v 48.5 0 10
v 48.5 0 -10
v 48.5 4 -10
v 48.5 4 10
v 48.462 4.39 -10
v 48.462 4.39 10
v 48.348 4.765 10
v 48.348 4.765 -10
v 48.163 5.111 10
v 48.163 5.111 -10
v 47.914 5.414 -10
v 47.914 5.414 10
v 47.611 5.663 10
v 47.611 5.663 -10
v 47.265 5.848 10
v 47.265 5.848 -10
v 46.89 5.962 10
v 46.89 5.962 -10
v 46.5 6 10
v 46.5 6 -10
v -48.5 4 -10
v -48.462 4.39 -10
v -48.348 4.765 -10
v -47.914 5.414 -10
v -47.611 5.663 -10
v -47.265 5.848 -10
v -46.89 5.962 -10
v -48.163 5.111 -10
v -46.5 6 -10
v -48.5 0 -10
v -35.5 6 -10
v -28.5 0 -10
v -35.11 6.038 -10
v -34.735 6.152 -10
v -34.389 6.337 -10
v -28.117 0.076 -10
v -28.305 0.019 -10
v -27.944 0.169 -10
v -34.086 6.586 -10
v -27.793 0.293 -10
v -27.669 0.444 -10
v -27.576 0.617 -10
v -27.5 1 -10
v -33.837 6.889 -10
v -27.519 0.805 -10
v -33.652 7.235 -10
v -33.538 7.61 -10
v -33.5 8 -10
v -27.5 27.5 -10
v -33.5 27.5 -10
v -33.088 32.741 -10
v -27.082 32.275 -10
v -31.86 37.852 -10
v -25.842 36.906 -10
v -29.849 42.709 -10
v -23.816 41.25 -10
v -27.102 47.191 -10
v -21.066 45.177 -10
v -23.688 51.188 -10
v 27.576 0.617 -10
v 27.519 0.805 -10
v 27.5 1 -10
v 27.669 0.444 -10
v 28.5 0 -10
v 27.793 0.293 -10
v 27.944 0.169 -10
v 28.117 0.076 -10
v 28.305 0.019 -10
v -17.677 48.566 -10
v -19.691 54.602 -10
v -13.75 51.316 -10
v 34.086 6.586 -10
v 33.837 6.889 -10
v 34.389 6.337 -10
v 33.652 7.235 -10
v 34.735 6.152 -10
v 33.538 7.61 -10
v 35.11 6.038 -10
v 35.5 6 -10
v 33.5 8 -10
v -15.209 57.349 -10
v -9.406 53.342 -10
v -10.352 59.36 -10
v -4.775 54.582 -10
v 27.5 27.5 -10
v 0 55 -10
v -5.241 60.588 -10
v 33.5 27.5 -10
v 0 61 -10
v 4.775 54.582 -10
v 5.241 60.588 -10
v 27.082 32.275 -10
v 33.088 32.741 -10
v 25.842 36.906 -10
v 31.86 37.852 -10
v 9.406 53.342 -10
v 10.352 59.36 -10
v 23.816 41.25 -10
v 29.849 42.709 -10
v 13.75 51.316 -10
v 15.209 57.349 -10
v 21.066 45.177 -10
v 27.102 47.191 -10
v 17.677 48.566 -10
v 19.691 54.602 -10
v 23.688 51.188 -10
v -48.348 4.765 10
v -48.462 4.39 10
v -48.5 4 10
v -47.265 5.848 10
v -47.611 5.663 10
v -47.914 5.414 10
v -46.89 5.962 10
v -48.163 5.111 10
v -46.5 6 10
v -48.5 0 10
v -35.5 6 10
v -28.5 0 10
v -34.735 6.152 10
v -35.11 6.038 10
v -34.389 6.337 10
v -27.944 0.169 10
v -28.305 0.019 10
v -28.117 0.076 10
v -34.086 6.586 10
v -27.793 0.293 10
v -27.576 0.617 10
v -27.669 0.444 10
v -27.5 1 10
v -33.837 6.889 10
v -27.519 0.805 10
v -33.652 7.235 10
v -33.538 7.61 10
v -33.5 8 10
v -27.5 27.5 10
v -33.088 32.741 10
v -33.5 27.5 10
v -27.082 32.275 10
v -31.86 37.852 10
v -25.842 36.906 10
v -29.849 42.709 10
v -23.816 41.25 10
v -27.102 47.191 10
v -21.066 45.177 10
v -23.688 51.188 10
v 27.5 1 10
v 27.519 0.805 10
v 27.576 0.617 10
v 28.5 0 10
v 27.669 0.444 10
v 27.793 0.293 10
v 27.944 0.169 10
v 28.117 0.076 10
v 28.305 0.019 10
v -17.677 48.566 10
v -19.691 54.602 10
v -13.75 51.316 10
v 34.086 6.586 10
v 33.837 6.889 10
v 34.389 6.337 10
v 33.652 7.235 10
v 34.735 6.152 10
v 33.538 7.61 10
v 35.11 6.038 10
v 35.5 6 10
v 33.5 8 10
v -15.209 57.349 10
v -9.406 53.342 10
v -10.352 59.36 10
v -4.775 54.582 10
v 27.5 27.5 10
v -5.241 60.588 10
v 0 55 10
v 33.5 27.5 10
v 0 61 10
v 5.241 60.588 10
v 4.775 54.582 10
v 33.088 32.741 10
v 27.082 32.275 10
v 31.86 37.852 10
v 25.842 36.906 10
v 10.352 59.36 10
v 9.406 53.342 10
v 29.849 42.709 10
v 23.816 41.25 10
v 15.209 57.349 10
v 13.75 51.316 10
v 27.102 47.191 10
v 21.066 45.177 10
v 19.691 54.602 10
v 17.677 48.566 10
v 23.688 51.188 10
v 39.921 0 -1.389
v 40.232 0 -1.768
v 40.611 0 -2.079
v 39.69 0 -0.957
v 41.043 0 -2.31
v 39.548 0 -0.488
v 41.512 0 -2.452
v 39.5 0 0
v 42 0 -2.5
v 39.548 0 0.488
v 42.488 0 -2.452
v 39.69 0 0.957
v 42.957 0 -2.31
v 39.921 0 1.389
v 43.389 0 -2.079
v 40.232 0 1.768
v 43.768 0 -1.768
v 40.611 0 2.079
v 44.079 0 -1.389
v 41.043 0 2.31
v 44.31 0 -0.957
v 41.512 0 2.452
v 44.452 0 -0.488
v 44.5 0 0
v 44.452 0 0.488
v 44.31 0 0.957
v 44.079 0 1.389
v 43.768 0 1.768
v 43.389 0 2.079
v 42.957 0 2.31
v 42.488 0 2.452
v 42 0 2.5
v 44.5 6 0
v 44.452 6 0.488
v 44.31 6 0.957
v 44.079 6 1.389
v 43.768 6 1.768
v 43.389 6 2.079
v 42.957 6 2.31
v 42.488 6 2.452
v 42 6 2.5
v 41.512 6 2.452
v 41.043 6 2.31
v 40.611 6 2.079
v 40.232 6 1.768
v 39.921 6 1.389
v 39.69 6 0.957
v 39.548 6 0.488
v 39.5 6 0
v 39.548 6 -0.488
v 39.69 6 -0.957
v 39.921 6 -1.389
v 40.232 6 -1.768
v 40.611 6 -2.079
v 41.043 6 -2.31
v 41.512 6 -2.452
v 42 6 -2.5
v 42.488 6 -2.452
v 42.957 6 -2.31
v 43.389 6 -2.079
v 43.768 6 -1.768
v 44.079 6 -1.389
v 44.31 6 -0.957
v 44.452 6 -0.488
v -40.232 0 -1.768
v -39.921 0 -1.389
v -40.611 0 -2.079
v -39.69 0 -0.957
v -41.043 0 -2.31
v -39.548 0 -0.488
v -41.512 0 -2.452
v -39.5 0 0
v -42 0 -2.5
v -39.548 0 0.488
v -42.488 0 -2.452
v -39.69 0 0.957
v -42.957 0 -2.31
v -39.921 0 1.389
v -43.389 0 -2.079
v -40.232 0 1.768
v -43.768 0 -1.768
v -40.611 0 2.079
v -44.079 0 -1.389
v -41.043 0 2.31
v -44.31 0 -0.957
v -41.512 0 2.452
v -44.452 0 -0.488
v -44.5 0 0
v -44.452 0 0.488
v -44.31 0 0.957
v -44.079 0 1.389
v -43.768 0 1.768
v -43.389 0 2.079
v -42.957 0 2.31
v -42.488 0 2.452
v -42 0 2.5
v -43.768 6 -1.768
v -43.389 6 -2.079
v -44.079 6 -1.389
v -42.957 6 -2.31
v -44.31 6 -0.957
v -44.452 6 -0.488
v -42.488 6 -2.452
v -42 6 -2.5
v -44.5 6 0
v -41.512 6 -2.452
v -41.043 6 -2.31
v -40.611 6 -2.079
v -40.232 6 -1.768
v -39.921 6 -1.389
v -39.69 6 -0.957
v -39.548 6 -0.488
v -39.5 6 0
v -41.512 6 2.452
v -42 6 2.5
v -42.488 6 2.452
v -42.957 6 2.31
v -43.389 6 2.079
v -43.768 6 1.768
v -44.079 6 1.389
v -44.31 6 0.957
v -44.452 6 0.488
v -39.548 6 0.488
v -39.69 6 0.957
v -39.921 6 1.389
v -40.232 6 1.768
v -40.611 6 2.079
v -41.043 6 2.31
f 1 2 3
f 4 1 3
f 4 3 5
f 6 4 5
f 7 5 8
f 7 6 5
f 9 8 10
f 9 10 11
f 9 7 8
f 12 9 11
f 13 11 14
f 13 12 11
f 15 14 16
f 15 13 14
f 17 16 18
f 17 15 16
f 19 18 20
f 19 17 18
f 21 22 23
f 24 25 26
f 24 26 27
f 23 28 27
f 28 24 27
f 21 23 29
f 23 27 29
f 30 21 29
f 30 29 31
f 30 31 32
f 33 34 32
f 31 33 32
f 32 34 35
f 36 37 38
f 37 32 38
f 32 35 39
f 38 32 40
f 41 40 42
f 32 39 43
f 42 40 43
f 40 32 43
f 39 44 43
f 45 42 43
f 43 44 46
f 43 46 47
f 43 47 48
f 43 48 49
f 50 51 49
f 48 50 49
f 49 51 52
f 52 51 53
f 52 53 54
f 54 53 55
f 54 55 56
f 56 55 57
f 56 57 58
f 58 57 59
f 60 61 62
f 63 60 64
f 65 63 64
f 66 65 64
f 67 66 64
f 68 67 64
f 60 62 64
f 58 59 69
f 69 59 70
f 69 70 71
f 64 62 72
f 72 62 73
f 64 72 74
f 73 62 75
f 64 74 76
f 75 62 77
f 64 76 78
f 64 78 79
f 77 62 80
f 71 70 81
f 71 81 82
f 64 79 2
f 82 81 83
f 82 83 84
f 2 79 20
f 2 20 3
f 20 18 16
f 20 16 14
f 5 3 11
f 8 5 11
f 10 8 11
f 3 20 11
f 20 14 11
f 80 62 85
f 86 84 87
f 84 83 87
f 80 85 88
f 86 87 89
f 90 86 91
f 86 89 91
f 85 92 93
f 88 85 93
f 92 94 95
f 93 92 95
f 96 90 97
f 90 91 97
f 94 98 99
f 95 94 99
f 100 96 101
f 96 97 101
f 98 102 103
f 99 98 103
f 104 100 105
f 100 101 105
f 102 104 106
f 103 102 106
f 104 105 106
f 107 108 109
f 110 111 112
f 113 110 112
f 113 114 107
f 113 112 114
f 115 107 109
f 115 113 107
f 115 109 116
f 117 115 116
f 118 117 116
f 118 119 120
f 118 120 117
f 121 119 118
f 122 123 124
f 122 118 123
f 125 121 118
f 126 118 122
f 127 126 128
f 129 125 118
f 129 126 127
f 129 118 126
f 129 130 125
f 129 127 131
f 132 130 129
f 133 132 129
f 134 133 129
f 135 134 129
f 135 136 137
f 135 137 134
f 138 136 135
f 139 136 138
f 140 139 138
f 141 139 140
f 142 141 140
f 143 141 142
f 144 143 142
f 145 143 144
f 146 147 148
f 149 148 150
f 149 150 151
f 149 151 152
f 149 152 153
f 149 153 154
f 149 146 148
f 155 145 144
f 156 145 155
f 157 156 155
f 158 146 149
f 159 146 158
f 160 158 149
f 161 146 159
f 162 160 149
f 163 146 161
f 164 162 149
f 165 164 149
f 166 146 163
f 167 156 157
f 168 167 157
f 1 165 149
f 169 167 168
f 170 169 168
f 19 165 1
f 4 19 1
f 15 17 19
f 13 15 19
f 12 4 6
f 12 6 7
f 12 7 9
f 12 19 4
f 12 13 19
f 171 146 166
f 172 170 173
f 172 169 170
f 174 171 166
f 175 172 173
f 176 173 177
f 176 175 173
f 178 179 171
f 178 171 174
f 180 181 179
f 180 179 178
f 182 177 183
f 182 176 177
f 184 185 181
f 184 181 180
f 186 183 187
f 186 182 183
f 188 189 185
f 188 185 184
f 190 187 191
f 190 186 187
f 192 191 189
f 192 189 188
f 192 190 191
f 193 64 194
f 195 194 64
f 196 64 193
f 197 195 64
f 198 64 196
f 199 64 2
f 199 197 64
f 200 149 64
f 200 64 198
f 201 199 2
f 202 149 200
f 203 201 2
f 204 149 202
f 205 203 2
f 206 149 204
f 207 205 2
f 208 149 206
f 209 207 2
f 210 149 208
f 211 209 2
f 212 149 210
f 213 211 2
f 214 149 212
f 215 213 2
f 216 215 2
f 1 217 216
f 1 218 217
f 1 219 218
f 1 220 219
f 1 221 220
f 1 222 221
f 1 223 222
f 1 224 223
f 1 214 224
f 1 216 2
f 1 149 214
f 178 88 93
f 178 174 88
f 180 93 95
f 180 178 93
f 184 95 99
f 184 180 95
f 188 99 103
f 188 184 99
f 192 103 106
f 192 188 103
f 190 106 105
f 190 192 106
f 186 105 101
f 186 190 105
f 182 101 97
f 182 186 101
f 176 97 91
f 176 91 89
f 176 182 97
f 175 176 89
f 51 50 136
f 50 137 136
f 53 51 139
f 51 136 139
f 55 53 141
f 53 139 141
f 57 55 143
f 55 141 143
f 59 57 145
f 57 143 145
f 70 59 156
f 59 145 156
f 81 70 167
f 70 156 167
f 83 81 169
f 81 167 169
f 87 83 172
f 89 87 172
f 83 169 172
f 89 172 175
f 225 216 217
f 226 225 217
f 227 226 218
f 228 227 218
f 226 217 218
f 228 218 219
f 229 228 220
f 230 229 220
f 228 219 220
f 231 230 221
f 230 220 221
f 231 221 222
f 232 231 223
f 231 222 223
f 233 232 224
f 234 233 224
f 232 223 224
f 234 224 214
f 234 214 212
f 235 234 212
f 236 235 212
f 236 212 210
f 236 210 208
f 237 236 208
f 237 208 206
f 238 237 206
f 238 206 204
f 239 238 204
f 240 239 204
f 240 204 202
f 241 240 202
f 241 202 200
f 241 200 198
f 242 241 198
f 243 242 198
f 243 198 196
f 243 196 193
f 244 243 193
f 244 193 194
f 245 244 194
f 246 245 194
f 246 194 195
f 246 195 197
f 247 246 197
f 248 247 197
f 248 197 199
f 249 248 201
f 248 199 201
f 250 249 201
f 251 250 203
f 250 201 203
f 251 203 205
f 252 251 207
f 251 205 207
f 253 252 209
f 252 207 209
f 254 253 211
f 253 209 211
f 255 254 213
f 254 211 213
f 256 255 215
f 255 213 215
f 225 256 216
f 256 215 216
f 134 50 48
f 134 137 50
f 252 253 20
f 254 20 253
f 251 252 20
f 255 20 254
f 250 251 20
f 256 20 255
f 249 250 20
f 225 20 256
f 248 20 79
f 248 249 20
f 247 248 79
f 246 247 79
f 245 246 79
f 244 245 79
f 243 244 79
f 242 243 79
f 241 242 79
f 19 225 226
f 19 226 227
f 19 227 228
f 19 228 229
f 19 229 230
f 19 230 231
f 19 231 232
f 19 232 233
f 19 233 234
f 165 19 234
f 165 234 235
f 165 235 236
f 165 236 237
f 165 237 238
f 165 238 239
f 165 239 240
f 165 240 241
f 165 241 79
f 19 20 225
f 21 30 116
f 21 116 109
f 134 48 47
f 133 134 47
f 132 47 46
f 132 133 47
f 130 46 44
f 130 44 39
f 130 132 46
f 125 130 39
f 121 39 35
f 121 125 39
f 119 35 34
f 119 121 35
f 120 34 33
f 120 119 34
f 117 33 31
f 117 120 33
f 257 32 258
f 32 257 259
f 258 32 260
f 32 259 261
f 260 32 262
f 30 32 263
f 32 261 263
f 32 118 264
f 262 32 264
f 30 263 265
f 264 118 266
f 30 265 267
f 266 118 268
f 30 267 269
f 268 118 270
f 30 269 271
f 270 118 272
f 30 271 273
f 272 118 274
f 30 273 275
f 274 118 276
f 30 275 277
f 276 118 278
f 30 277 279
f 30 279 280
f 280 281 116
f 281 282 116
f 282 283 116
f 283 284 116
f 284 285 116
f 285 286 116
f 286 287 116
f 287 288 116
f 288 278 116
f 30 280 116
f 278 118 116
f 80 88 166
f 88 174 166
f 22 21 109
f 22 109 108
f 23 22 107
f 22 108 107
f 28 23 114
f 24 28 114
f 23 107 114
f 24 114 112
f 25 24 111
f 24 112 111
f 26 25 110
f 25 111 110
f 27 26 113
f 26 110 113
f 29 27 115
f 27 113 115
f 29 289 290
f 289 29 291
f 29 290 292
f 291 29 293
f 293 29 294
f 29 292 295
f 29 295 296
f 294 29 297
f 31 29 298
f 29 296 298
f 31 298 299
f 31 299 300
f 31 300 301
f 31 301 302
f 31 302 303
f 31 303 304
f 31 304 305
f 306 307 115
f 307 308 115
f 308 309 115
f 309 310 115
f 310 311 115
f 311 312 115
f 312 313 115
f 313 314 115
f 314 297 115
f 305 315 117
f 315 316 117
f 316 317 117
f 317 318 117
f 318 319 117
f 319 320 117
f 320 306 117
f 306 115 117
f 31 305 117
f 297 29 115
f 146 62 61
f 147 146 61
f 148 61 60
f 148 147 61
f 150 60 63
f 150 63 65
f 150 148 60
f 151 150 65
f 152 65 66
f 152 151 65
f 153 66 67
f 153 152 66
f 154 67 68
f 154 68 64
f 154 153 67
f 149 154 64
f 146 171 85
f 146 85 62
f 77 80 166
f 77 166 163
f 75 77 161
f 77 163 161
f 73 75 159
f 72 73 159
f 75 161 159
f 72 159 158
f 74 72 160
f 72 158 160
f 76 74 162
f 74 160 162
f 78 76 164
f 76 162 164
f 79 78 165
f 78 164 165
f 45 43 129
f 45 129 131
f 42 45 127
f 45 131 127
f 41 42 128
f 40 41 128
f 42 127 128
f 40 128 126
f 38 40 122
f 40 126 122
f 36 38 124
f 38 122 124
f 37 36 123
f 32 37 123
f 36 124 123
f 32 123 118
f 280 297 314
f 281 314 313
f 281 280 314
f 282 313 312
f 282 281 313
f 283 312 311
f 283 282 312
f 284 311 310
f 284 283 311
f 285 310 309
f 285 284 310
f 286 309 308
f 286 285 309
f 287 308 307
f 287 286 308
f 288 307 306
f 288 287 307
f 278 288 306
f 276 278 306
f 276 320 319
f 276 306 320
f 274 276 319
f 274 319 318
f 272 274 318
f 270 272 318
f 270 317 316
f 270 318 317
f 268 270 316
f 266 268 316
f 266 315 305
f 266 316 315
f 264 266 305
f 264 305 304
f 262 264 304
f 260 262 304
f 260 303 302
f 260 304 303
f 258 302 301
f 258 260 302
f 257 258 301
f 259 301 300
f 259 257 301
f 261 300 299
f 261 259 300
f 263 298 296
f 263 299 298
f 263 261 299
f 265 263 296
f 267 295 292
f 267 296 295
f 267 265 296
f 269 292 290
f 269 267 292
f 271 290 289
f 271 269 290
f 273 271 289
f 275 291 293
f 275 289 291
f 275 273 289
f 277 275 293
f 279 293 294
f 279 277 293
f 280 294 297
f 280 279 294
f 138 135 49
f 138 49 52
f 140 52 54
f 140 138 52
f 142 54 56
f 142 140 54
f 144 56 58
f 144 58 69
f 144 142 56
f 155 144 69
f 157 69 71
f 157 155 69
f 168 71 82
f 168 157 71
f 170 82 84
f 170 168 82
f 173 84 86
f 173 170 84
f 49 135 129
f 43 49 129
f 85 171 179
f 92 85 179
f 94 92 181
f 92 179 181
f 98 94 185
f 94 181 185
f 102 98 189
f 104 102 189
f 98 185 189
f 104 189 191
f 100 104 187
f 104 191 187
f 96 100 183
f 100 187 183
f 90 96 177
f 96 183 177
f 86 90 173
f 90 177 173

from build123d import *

# Parameters (mm, degrees)
PAD_DEPTH                  = 10
SKETCH001_R                = 2.5
POCKET_DEPTH               = 293.638056
SKETCH001_MIRRORED001_2_R  = 2.5
POCKET_MIRRORED001_2_DEPTH = 293.638056


with BuildPart() as part:
    # Sketch → Pad (new body, symmetric)
    with BuildSketch(Plane.XY):
        with BuildLine():
            ThreePointArc((27.5, 27.5), (19.445436, 46.945436), (0, 55))
            Line((0, 55), (0, 61))
            ThreePointArc((33.5, 27.5), (23.688077, 51.188077), (0, 61))
            Line((33.5, 27.5), (33.5, 8))
            ThreePointArc((33.5, 8), (34.085786, 6.585786), (35.5, 6))
            Line((46.5, 6), (35.5, 6))
            ThreePointArc((48.5, 4), (47.914214, 5.414214), (46.5, 6))
            Line((48.5, 0), (48.5, 4))
            Line((28.5, 0), (48.5, 0))
            ThreePointArc((27.5, 1), (27.792893, 0.292893), (28.5, 0))
            Line((27.5, 27.5), (27.5, 1))
        make_face()
    pad = extrude(amount=PAD_DEPTH, both=True)

    # Mirrored: Pad across Sketch V_Axis
    add(pad.mirror(Plane(origin=(0, 0, 0), x_dir=(0, 0, 1), z_dir=(1, 0, 0))))

    # Sketch001 → Pocket (cut, through all)
    with BuildSketch(Plane.XZ):
        with Locations((42, 0)):
            Circle(SKETCH001_R)
    pocket = extrude(amount=-POCKET_DEPTH, mode=Mode.SUBTRACT)

    # Sketch001 Mirrored001 2 → Pocket Mirrored001 2 (cut, through all)
    with BuildSketch(Plane(origin=(0, 0, 0), x_dir=(1, 0, 0), z_dir=(0, 1, 0))):
        with Locations((42, 0)):
            Circle(SKETCH001_MIRRORED001_2_R)
    pocket_mirrored001_2 = extrude(amount=POCKET_MIRRORED001_2_DEPTH, mode=Mode.SUBTRACT)

    # Mirrored002: Pocket, Pocket Mirrored001 2 across Sketch001 V_Axis
    add(pocket.mirror(Plane(origin=(0, 0, 0), x_dir=(0, -1, 0), z_dir=(1, 0, 0))), mode=Mode.SUBTRACT)
    add(pocket_mirrored001_2.mirror(Plane(origin=(0, 0, 0), x_dir=(0, -1, 0), z_dir=(1, 0, 0))), mode=Mode.SUBTRACT)


solid = part.part
